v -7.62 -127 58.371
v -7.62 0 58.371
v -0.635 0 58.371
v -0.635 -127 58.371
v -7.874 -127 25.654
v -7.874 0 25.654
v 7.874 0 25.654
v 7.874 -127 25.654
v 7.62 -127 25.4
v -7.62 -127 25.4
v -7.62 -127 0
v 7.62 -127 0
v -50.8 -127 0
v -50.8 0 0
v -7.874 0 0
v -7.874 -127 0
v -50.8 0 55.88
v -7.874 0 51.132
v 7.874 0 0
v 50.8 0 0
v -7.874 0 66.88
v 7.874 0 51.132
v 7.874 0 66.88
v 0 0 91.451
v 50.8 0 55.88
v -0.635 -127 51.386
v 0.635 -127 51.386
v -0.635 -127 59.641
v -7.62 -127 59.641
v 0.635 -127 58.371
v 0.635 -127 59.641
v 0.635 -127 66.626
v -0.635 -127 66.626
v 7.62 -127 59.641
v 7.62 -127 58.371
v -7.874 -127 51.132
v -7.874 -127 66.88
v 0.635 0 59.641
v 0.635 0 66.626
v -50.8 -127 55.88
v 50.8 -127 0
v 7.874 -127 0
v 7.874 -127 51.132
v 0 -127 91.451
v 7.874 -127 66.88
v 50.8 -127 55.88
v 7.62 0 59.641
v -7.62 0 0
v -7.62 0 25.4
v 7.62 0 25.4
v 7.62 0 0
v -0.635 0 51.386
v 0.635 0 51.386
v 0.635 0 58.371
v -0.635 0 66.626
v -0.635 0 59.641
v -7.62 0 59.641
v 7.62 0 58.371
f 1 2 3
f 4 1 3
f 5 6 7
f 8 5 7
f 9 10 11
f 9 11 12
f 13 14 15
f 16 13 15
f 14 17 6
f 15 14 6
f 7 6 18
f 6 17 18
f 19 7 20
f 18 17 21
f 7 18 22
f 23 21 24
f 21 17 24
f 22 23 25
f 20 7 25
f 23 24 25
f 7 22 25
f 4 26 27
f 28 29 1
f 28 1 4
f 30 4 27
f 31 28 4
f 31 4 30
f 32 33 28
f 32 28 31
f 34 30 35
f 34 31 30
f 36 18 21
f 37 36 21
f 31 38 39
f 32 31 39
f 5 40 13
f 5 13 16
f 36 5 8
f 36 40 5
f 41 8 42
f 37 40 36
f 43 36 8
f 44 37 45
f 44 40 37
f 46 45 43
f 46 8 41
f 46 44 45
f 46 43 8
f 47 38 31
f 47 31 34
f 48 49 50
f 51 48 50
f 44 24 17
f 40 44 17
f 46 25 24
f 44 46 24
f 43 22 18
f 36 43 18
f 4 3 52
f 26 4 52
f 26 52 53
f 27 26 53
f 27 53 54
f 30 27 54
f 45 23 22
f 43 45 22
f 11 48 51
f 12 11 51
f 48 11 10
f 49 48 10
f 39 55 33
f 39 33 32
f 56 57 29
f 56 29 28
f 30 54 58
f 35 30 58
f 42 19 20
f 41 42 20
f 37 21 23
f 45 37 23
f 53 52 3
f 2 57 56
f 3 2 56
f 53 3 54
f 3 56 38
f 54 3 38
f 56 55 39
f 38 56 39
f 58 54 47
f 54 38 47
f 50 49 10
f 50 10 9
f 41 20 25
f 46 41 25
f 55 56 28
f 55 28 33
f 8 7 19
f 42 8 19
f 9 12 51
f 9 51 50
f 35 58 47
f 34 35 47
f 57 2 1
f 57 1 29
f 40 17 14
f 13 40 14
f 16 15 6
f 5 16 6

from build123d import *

# Parameters (mm, degrees)
F1_DEPTH = 127
F0_W     = 1.27
F0_H     = 6.985
F0_W_2   = 6.985
F0_H_2   = 1.27
F0_H_3   = 2.4906031942
F0_H_4   = 4.4943968058
F0_W_3   = 15.24
F0_H_5   = 25.4


with BuildPart() as f1:
    # F0 (on Front) → F1 (new body)
    with BuildSketch(Plane.XZ):
        Polygon((0, 91.4505429411), (-50.8, 55.88), (-7.874, 55.88), (-7.874, 66.8796031942), (7.874, 66.8796031942), (7.874, 55.88), (50.8, 55.88), align=None)
        Polygon((-50.8, 0), (-7.874, 0), (-7.874, 25.654), (7.874, 25.654), (7.874, 0), (50.8, 0), (50.8, 55.88), (7.874, 55.88), (7.874, 51.1316031942), (-7.874, 51.1316031942), (-7.874, 55.88), (-50.8, 55.88), align=None)
    extrude(amount=F1_DEPTH)


with BuildPart() as f1b:
    # F0 (on Front) → F1, piece 2 (new body)
    with BuildSketch(Plane.XZ):
        with Locations((0, 63.1331031942)):
            Rectangle(F0_W, F0_H)
        with Locations((4.1275, 59.0056031942)):
            Rectangle(F0_W_2, F0_H_2)
        with Locations((-4.1275, 59.0056031942)):
            Rectangle(F0_W_2, F0_H_2)
        with Locations((0, 59.0056031942)):
            Rectangle(F0_W, F0_H_2)
        with Locations((0, 57.1253015971)):
            Rectangle(F0_W, F0_H_3)
        with Locations((0, 53.6328015971)):
            Rectangle(F0_W, F0_H_4)
    extrude(amount=F1_DEPTH)


with BuildPart() as f1c:
    # F0 (on Front) → F1, piece 3 (new body)
    with BuildSketch(Plane.XZ):
        with Locations((0, 12.7)):
            Rectangle(F0_W_3, F0_H_5)
    extrude(amount=F1_DEPTH)


solid = Compound([f1.part, f1b.part, f1c.part])
